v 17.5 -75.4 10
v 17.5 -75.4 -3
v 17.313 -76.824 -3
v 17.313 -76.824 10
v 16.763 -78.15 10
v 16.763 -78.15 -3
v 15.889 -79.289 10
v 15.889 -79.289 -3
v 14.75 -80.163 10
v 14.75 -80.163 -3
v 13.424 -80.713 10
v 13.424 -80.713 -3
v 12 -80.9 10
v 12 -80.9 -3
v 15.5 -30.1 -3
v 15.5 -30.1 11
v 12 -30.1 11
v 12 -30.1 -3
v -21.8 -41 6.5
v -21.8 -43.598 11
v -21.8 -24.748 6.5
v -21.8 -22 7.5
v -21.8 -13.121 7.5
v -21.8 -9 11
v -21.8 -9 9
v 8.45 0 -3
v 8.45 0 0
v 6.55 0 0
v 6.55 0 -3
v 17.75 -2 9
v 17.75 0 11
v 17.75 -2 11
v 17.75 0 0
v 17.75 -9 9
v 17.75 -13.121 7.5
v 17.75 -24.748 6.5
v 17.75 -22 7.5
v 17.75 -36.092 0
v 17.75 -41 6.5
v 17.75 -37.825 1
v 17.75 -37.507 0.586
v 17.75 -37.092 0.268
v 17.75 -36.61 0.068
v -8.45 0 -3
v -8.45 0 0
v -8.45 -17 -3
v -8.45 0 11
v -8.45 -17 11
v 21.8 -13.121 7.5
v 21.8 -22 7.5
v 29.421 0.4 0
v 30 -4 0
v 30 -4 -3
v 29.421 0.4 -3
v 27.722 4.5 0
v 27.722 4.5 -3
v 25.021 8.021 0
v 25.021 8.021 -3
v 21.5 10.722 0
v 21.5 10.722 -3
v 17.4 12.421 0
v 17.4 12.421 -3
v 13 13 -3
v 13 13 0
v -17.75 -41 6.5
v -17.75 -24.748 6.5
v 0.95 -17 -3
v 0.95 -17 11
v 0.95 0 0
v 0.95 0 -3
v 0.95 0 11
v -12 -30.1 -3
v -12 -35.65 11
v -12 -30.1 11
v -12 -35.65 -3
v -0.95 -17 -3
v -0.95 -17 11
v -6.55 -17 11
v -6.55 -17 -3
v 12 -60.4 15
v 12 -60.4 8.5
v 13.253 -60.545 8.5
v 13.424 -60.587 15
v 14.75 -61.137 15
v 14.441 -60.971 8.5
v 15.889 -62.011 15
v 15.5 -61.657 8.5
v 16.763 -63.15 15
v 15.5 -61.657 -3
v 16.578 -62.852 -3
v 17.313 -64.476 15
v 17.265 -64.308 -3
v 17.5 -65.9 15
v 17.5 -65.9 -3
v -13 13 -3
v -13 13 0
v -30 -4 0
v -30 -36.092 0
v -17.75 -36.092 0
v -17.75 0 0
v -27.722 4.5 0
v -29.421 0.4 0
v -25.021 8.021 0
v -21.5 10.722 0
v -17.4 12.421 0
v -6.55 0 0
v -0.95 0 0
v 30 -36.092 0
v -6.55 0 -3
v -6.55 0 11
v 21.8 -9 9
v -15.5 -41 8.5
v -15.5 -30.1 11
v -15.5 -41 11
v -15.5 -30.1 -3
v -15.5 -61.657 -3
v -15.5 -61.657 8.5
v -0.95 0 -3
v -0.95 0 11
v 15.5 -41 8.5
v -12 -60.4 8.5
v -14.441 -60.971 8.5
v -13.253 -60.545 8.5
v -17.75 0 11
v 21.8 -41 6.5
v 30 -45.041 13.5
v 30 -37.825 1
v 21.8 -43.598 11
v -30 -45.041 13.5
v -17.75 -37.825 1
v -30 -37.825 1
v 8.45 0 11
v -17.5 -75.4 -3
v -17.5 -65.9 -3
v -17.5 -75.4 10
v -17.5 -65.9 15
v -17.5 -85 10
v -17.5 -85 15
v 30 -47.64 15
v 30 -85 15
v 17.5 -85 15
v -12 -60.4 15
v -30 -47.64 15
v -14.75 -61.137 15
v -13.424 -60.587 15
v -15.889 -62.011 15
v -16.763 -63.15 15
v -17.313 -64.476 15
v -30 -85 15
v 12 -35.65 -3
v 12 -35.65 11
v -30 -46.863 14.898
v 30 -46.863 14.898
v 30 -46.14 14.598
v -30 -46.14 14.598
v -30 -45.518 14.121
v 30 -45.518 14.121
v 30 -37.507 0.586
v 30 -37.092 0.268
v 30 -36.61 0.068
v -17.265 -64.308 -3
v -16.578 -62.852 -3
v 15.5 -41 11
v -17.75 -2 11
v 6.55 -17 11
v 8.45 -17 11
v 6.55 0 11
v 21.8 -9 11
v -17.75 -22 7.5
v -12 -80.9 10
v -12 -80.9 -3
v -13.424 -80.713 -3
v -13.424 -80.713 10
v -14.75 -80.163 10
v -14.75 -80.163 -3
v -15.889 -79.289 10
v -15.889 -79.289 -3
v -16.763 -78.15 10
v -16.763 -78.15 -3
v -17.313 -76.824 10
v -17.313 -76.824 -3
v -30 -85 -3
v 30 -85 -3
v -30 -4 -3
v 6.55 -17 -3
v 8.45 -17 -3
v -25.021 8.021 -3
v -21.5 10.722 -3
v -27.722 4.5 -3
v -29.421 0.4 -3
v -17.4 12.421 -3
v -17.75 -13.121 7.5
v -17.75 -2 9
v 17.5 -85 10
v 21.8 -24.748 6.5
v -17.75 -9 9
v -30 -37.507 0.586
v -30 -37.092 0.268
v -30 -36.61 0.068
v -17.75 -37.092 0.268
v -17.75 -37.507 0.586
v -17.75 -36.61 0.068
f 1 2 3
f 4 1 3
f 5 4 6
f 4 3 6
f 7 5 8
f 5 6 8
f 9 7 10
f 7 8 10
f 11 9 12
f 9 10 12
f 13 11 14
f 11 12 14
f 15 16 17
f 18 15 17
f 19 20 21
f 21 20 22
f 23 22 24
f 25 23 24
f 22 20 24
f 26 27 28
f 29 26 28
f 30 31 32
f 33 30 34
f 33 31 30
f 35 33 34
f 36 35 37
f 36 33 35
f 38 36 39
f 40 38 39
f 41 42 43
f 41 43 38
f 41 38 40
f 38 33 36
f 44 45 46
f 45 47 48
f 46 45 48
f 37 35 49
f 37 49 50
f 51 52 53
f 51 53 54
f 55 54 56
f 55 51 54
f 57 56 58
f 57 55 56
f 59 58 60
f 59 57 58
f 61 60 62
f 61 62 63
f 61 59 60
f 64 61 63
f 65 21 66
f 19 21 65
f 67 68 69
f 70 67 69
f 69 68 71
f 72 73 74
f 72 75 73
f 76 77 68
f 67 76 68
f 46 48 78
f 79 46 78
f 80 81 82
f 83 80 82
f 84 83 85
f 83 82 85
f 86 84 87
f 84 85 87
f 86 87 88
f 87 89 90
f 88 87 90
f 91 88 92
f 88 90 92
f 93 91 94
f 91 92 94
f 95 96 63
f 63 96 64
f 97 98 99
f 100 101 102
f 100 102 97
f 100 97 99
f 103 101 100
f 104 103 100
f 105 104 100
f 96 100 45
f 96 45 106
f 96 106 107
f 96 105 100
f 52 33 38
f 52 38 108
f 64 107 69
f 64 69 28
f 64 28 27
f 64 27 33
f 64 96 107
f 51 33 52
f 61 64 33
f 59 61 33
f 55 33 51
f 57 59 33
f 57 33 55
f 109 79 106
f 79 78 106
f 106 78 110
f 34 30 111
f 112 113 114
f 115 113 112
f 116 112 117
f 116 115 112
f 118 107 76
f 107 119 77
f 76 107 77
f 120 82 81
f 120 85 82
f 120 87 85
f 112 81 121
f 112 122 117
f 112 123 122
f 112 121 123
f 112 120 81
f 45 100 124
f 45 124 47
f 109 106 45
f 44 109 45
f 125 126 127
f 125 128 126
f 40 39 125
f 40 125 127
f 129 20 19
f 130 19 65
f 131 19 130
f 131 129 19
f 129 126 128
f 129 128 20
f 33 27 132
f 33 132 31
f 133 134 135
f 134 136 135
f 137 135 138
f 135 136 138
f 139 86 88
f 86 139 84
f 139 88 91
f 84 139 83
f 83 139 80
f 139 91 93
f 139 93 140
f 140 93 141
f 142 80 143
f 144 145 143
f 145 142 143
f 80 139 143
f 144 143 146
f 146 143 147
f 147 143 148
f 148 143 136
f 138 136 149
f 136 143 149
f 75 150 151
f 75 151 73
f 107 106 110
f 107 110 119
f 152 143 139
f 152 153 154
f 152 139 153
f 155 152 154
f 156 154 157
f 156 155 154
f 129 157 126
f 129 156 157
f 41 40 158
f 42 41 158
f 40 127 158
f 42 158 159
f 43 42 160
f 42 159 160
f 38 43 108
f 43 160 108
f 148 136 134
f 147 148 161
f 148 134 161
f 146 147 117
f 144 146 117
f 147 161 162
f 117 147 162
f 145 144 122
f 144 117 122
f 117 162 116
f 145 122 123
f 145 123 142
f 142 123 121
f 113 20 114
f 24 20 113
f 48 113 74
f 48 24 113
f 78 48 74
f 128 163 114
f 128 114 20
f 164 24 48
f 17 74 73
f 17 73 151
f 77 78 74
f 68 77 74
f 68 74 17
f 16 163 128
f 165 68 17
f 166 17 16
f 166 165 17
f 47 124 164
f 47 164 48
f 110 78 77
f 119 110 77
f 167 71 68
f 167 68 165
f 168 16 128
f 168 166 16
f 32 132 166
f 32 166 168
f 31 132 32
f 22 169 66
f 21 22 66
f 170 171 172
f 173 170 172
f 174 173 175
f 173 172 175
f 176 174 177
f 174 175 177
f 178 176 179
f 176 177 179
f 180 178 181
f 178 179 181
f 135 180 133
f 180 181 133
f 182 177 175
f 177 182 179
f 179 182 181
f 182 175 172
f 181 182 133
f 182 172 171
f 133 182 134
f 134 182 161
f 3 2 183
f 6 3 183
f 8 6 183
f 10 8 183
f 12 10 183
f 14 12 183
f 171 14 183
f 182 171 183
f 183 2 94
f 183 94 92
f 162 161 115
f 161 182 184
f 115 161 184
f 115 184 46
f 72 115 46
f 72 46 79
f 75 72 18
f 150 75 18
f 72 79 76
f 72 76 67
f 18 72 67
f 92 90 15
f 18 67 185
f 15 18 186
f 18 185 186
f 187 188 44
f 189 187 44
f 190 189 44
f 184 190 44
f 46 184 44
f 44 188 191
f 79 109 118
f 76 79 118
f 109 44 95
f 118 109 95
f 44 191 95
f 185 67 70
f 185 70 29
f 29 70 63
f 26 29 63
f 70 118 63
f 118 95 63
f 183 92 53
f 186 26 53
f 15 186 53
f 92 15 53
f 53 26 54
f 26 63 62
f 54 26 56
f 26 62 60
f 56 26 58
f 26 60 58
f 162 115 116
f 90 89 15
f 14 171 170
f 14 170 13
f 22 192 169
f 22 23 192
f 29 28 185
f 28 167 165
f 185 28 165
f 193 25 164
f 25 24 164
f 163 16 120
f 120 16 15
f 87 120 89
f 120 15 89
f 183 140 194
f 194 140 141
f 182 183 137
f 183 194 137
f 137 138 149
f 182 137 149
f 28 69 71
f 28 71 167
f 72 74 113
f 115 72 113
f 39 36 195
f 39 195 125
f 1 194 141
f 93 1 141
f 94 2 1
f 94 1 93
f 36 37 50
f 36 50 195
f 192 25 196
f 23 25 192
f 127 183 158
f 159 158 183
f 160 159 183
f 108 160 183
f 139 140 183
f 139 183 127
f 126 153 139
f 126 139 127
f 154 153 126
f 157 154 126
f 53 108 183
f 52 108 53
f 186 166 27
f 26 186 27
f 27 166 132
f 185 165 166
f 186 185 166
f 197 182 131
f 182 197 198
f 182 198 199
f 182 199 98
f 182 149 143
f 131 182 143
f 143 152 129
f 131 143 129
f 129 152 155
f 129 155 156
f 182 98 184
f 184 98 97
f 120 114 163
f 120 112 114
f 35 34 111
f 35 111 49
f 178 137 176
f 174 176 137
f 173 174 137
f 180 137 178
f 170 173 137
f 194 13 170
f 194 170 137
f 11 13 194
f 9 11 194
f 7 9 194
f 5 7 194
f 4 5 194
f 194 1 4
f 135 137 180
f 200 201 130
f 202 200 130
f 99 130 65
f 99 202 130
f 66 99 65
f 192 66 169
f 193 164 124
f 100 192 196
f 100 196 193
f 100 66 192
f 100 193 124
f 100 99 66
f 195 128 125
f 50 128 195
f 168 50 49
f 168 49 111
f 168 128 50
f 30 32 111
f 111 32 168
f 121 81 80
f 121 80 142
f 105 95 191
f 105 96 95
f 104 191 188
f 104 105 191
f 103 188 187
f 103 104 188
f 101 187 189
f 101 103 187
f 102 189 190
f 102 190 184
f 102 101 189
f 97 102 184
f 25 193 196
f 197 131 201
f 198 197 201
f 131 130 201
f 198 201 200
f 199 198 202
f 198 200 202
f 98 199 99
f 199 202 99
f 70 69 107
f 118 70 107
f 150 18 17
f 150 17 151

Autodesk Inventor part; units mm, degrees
ref_plane "YZ Plane" through (0, 0, 0) normal (1, 0, 0) x (0, 1, 0)
ref_plane "XZ Plane" through (0, 0, 0) normal (0, 1, 0) x (-1, 0, 0)
sketch "Sketch1" plane through (0, 0, 0) normal (0, 0, 1) x (1, 0, 0)
  line L0 (-17.75, 0) -> (17.75, 0)
  line L1 (17.75, 0) -> (17.75, -85)
  line L2 (17.75, -85) -> (-17.75, -85)
  line L3 (-17.75, -85) -> (-17.75, 0)
  point P0 (0, 0)
  point P1 (0, 0)
  dimension "d0" = 35.5
  dimension "d1" = 85
extrude "Extrusion1" add sketch "Sketch1" along normal blind 11
sketch "Sketch2" plane through (0, 0, 0) normal (1, 0, 0) x (0, 1, 0)
  line L0 (-85, 0) -> (0, 0) projected
  line L1 (-85, 0) -> (-85, 11) projected
  line L2 (0, 11) -> (-85, 11) projected
  line L3 (0, 0) -> (0, 11) projected
  line L4 (-85, 82.7102) -> (-37.2472, 0)
  line L5 (0, 0) -> (0, 11) projected
  line L6 (0, 9) -> (-9, 9)
  line L7 (-9, 9) -> (-13.1212, 7.5)
  line L8 (-13.1212, 7.5) -> (-22, 7.5)
  line L9 (-22, 7.5) -> (-24.7475, 6.5)
  line L10 (-24.7475, 6.5) -> (-41, 6.5)
  line L11 (-45.9075, 15) -> (-85, 15)
  line L12 (-85, 15) -> (-85, 11)
  point P0 (-43.5981, 11)
  dimension "d6" = 60
  dimension "d7" = 20
  dimension "d8" = 2
  dimension "d9" = 3.5
  dimension "d10" = 4.5
  dimension "d11" = 6.5
  dimension "d12" = 9
  dimension "d13" = 13.1212
  dimension "d14" = 24.7475
  dimension "d15" = 22
  dimension "d16" = 41
  dimension "d25" = 15
  dimension "d26" = 4
extrude "Extrusion2" add sketch "Sketch2" along normal mid plane 60 contours L1 L2 L4 L0 | L12 L11 L4 L2
extrude "Extrusion4" add sketch "Sketch2" along normal mid plane 43.6 contours L4 L2 L3 L6 L7 L8 L9 L10
sketch "Sketch3" plane through (0, 0, 0) normal (0, 0, 1) x (1, 0, 0)
  line L0 (-13, 13) -> (13, 13)
  line L1 (-17.75, 0) -> (17.75, 0) projected
  line L2 (-30, -37.2472) -> (-30, -85) projected
  line L3 (30, -85) -> (30, -37.2472) projected
  line L4 (30, -85) -> (-30, -85) projected
  arc A0 (-13, 13) -> (-30, -4) centre (-13, -4) ccw
  arc A1 (30, -4) -> (13, 13) centre (13, -4) ccw
  line L5 (-30, -37.2472) -> (-30, -4)
  line L6 (30, -37.2472) -> (30, -4)
  point P0 (0, 0)
  dimension "d28" = 13
  dimension "d29" = 17
extrude "Extrusion5" add sketch "Sketch3" against normal blind 3
fillet "Fillet1" radius 3 1 edges at (0, -45.9075, 15)
fillet "Fillet2" radius 2 2 edges at (23.875, -37.2472, 0) (-23.875, -37.2472, 0)
sketch "Sketch4" plane through (0, 0, 11) normal (0, 0, 1) x (1, 0, 0)
  line L0 (21.8, -43.5981) -> (-21.8, -43.5981) projected
  line L1 (21.8, 0) -> (21.8, -43.5981) projected
  line L2 (21.8, 0) -> (-21.8, 0) projected
  line L3 (-21.8, -43.5981) -> (-21.8, 0) projected
  line L4 (-21.8, -43.5981) -> (-21.8, 0) projected
  line L5 (-21.8, -9) -> (-17.75, -2)
  line L6 (-21.8, -9) -> (-13.7128, -9) construction
  line L7 (-17.75, -2) -> (-17.75, 0)
  line L8 (21.8, 0) -> (-21.8, 0) projected
  point P0 (0, 0)
  dimension "d34" = 2
extrude "Extrusion6" cut sketch "Sketch4" against normal up to next contours L3 L2 L7 L5
mirror "Mirror1" about plane through (0, 0, 0) normal (1, 0, 0) of "Extrusion6"
sketch "Sketch5" plane through (0, 0, 11) normal (0, 0, 1) x (1, 0, 0)
  line L0 (0.95, 0) -> (-0.95, 0)
  line L1 (-0.95, 0) -> (-0.95, -17)
  line L2 (-0.95, -17) -> (0.95, -17)
  line L3 (0.95, -17) -> (0.95, 0)
  line L4 (8.45, 0) -> (6.55, 0)
  line L5 (6.55, 0) -> (6.55, -17)
  line L6 (6.55, -17) -> (8.45, -17)
  line L7 (8.45, -17) -> (8.45, 0)
  line L8 (-6.55, 0) -> (-8.45, 0)
  line L9 (-8.45, 0) -> (-8.45, -17)
  line L10 (-8.45, -17) -> (-6.55, -17)
  line L11 (-6.55, -17) -> (-6.55, 0)
  line L12 (17.75, 0) -> (-17.75, 0) projected
  point P0 (0, 0)
  point P1 (7.5, 0)
  point P2 (-7.5, 0)
  point P3 (0, 0)
  dimension "d37" = 7.5
  dimension "d38" = 7.5
  dimension "d39" = 1.9
  dimension "d40" = 17
extrude "Extrusion7" cut sketch "Sketch5" against normal up to surface (14 mm away)
ref_plane "Work Plane1" through (0, 0, 8) normal (0, 0, 1) x (1, 0, 0)
sketch "Sketch8" plane through (-30, -85, 15) normal (0, 0, 1) x (1, 0, 0)
  line L0 (14.5, 54.9) -> (14.5, 44)
  line L1 (14.5, 44) -> (45.5, 44)
  line L2 (45.5, 44) -> (45.5, 54.9)
  line L3 (45.5, 54.9) -> (42, 54.9)
  line L4 (42, 54.9) -> (42, 49.35)
  line L5 (42, 49.35) -> (18, 49.35)
  line L6 (18, 49.35) -> (18, 54.9)
  line L7 (18, 54.9) -> (14.5, 54.9)
  line L8 (12.5, 4.1) -> (47.5, 4.1)
  line L9 (47.5, 4.1) -> (47.5, 24.6)
  line L10 (47.5, 24.6) -> (12.5, 24.6)
  line L11 (12.5, 24.6) -> (12.5, 4.1)
  arc A0 (12.5, 9.6) -> (18, 4.1) centre (18, 9.6) ccw
  arc A1 (18, 24.6) -> (12.5, 19.1) centre (18, 19.1) ccw
  arc A2 (42, 4.1) -> (47.5, 9.6) centre (42, 9.6) ccw
  arc A3 (47.5, 19.1) -> (42, 24.6) centre (42, 19.1) ccw
  line L12 (12.5, 4.1) -> (12.5, 0)
  line L13 (0, 0) -> (60, 0) projected
  line L14 (47.5, 4.1) -> (47.5, 0)
  point P0 (30, 85)
  point P1 (30, 44)
  point P2 (30, 24.6)
  dimension "d59" = 41
  dimension "d60" = 31
  dimension "d61" = 5.35
  dimension "d62" = 10.9
  dimension "d63" = 3.5
  dimension "d64" = 19.4
  dimension "d65" = 35
  dimension "d66" = 20.5
  dimension "d67" = 5.5
extrude "Extrusion11" cut sketch "Sketch8" along normal through all both and the other way through all contours L7 L6 L5 L4 L3 L2 L1 L0 | A0 L11 A1 L10 A3 L9 A2 L8
extrude "Extrusion12" cut sketch "Sketch8" against normal blind 5 contours L11 A0 L8 | L8 L14 L13 L12 | A2 L9 L8
sketch "Sketch9" plane through (0, 0, -3) normal (0, 0, -1) x (-1, 0, 0)
  line L0 (15.5, -41) -> (-15.5, -41) projected
  line L1 (-12, -60.4) -> (12, -60.4) projected
  arc A0 (17.5, -65.9) -> (12, -60.4) centre (12, -65.9) ccw projected
  arc A1 (-12, -60.4) -> (-17.5, -65.9) centre (-12, -65.9) ccw projected
  line L2 (15.5, -41) -> (15.5, -61.6574)
  line L3 (30, -37.8246) -> (17.75, -37.8246) projected
  line L4 (-15.5, -41) -> (-15.5, -61.6574)
  point P0 (0, 0)
extrude "Extrusion13" cut sketch "Sketch9" against normal blind 11.5
equation "\"overprint\" = 0.1"
properties part number "gehaeuse"
